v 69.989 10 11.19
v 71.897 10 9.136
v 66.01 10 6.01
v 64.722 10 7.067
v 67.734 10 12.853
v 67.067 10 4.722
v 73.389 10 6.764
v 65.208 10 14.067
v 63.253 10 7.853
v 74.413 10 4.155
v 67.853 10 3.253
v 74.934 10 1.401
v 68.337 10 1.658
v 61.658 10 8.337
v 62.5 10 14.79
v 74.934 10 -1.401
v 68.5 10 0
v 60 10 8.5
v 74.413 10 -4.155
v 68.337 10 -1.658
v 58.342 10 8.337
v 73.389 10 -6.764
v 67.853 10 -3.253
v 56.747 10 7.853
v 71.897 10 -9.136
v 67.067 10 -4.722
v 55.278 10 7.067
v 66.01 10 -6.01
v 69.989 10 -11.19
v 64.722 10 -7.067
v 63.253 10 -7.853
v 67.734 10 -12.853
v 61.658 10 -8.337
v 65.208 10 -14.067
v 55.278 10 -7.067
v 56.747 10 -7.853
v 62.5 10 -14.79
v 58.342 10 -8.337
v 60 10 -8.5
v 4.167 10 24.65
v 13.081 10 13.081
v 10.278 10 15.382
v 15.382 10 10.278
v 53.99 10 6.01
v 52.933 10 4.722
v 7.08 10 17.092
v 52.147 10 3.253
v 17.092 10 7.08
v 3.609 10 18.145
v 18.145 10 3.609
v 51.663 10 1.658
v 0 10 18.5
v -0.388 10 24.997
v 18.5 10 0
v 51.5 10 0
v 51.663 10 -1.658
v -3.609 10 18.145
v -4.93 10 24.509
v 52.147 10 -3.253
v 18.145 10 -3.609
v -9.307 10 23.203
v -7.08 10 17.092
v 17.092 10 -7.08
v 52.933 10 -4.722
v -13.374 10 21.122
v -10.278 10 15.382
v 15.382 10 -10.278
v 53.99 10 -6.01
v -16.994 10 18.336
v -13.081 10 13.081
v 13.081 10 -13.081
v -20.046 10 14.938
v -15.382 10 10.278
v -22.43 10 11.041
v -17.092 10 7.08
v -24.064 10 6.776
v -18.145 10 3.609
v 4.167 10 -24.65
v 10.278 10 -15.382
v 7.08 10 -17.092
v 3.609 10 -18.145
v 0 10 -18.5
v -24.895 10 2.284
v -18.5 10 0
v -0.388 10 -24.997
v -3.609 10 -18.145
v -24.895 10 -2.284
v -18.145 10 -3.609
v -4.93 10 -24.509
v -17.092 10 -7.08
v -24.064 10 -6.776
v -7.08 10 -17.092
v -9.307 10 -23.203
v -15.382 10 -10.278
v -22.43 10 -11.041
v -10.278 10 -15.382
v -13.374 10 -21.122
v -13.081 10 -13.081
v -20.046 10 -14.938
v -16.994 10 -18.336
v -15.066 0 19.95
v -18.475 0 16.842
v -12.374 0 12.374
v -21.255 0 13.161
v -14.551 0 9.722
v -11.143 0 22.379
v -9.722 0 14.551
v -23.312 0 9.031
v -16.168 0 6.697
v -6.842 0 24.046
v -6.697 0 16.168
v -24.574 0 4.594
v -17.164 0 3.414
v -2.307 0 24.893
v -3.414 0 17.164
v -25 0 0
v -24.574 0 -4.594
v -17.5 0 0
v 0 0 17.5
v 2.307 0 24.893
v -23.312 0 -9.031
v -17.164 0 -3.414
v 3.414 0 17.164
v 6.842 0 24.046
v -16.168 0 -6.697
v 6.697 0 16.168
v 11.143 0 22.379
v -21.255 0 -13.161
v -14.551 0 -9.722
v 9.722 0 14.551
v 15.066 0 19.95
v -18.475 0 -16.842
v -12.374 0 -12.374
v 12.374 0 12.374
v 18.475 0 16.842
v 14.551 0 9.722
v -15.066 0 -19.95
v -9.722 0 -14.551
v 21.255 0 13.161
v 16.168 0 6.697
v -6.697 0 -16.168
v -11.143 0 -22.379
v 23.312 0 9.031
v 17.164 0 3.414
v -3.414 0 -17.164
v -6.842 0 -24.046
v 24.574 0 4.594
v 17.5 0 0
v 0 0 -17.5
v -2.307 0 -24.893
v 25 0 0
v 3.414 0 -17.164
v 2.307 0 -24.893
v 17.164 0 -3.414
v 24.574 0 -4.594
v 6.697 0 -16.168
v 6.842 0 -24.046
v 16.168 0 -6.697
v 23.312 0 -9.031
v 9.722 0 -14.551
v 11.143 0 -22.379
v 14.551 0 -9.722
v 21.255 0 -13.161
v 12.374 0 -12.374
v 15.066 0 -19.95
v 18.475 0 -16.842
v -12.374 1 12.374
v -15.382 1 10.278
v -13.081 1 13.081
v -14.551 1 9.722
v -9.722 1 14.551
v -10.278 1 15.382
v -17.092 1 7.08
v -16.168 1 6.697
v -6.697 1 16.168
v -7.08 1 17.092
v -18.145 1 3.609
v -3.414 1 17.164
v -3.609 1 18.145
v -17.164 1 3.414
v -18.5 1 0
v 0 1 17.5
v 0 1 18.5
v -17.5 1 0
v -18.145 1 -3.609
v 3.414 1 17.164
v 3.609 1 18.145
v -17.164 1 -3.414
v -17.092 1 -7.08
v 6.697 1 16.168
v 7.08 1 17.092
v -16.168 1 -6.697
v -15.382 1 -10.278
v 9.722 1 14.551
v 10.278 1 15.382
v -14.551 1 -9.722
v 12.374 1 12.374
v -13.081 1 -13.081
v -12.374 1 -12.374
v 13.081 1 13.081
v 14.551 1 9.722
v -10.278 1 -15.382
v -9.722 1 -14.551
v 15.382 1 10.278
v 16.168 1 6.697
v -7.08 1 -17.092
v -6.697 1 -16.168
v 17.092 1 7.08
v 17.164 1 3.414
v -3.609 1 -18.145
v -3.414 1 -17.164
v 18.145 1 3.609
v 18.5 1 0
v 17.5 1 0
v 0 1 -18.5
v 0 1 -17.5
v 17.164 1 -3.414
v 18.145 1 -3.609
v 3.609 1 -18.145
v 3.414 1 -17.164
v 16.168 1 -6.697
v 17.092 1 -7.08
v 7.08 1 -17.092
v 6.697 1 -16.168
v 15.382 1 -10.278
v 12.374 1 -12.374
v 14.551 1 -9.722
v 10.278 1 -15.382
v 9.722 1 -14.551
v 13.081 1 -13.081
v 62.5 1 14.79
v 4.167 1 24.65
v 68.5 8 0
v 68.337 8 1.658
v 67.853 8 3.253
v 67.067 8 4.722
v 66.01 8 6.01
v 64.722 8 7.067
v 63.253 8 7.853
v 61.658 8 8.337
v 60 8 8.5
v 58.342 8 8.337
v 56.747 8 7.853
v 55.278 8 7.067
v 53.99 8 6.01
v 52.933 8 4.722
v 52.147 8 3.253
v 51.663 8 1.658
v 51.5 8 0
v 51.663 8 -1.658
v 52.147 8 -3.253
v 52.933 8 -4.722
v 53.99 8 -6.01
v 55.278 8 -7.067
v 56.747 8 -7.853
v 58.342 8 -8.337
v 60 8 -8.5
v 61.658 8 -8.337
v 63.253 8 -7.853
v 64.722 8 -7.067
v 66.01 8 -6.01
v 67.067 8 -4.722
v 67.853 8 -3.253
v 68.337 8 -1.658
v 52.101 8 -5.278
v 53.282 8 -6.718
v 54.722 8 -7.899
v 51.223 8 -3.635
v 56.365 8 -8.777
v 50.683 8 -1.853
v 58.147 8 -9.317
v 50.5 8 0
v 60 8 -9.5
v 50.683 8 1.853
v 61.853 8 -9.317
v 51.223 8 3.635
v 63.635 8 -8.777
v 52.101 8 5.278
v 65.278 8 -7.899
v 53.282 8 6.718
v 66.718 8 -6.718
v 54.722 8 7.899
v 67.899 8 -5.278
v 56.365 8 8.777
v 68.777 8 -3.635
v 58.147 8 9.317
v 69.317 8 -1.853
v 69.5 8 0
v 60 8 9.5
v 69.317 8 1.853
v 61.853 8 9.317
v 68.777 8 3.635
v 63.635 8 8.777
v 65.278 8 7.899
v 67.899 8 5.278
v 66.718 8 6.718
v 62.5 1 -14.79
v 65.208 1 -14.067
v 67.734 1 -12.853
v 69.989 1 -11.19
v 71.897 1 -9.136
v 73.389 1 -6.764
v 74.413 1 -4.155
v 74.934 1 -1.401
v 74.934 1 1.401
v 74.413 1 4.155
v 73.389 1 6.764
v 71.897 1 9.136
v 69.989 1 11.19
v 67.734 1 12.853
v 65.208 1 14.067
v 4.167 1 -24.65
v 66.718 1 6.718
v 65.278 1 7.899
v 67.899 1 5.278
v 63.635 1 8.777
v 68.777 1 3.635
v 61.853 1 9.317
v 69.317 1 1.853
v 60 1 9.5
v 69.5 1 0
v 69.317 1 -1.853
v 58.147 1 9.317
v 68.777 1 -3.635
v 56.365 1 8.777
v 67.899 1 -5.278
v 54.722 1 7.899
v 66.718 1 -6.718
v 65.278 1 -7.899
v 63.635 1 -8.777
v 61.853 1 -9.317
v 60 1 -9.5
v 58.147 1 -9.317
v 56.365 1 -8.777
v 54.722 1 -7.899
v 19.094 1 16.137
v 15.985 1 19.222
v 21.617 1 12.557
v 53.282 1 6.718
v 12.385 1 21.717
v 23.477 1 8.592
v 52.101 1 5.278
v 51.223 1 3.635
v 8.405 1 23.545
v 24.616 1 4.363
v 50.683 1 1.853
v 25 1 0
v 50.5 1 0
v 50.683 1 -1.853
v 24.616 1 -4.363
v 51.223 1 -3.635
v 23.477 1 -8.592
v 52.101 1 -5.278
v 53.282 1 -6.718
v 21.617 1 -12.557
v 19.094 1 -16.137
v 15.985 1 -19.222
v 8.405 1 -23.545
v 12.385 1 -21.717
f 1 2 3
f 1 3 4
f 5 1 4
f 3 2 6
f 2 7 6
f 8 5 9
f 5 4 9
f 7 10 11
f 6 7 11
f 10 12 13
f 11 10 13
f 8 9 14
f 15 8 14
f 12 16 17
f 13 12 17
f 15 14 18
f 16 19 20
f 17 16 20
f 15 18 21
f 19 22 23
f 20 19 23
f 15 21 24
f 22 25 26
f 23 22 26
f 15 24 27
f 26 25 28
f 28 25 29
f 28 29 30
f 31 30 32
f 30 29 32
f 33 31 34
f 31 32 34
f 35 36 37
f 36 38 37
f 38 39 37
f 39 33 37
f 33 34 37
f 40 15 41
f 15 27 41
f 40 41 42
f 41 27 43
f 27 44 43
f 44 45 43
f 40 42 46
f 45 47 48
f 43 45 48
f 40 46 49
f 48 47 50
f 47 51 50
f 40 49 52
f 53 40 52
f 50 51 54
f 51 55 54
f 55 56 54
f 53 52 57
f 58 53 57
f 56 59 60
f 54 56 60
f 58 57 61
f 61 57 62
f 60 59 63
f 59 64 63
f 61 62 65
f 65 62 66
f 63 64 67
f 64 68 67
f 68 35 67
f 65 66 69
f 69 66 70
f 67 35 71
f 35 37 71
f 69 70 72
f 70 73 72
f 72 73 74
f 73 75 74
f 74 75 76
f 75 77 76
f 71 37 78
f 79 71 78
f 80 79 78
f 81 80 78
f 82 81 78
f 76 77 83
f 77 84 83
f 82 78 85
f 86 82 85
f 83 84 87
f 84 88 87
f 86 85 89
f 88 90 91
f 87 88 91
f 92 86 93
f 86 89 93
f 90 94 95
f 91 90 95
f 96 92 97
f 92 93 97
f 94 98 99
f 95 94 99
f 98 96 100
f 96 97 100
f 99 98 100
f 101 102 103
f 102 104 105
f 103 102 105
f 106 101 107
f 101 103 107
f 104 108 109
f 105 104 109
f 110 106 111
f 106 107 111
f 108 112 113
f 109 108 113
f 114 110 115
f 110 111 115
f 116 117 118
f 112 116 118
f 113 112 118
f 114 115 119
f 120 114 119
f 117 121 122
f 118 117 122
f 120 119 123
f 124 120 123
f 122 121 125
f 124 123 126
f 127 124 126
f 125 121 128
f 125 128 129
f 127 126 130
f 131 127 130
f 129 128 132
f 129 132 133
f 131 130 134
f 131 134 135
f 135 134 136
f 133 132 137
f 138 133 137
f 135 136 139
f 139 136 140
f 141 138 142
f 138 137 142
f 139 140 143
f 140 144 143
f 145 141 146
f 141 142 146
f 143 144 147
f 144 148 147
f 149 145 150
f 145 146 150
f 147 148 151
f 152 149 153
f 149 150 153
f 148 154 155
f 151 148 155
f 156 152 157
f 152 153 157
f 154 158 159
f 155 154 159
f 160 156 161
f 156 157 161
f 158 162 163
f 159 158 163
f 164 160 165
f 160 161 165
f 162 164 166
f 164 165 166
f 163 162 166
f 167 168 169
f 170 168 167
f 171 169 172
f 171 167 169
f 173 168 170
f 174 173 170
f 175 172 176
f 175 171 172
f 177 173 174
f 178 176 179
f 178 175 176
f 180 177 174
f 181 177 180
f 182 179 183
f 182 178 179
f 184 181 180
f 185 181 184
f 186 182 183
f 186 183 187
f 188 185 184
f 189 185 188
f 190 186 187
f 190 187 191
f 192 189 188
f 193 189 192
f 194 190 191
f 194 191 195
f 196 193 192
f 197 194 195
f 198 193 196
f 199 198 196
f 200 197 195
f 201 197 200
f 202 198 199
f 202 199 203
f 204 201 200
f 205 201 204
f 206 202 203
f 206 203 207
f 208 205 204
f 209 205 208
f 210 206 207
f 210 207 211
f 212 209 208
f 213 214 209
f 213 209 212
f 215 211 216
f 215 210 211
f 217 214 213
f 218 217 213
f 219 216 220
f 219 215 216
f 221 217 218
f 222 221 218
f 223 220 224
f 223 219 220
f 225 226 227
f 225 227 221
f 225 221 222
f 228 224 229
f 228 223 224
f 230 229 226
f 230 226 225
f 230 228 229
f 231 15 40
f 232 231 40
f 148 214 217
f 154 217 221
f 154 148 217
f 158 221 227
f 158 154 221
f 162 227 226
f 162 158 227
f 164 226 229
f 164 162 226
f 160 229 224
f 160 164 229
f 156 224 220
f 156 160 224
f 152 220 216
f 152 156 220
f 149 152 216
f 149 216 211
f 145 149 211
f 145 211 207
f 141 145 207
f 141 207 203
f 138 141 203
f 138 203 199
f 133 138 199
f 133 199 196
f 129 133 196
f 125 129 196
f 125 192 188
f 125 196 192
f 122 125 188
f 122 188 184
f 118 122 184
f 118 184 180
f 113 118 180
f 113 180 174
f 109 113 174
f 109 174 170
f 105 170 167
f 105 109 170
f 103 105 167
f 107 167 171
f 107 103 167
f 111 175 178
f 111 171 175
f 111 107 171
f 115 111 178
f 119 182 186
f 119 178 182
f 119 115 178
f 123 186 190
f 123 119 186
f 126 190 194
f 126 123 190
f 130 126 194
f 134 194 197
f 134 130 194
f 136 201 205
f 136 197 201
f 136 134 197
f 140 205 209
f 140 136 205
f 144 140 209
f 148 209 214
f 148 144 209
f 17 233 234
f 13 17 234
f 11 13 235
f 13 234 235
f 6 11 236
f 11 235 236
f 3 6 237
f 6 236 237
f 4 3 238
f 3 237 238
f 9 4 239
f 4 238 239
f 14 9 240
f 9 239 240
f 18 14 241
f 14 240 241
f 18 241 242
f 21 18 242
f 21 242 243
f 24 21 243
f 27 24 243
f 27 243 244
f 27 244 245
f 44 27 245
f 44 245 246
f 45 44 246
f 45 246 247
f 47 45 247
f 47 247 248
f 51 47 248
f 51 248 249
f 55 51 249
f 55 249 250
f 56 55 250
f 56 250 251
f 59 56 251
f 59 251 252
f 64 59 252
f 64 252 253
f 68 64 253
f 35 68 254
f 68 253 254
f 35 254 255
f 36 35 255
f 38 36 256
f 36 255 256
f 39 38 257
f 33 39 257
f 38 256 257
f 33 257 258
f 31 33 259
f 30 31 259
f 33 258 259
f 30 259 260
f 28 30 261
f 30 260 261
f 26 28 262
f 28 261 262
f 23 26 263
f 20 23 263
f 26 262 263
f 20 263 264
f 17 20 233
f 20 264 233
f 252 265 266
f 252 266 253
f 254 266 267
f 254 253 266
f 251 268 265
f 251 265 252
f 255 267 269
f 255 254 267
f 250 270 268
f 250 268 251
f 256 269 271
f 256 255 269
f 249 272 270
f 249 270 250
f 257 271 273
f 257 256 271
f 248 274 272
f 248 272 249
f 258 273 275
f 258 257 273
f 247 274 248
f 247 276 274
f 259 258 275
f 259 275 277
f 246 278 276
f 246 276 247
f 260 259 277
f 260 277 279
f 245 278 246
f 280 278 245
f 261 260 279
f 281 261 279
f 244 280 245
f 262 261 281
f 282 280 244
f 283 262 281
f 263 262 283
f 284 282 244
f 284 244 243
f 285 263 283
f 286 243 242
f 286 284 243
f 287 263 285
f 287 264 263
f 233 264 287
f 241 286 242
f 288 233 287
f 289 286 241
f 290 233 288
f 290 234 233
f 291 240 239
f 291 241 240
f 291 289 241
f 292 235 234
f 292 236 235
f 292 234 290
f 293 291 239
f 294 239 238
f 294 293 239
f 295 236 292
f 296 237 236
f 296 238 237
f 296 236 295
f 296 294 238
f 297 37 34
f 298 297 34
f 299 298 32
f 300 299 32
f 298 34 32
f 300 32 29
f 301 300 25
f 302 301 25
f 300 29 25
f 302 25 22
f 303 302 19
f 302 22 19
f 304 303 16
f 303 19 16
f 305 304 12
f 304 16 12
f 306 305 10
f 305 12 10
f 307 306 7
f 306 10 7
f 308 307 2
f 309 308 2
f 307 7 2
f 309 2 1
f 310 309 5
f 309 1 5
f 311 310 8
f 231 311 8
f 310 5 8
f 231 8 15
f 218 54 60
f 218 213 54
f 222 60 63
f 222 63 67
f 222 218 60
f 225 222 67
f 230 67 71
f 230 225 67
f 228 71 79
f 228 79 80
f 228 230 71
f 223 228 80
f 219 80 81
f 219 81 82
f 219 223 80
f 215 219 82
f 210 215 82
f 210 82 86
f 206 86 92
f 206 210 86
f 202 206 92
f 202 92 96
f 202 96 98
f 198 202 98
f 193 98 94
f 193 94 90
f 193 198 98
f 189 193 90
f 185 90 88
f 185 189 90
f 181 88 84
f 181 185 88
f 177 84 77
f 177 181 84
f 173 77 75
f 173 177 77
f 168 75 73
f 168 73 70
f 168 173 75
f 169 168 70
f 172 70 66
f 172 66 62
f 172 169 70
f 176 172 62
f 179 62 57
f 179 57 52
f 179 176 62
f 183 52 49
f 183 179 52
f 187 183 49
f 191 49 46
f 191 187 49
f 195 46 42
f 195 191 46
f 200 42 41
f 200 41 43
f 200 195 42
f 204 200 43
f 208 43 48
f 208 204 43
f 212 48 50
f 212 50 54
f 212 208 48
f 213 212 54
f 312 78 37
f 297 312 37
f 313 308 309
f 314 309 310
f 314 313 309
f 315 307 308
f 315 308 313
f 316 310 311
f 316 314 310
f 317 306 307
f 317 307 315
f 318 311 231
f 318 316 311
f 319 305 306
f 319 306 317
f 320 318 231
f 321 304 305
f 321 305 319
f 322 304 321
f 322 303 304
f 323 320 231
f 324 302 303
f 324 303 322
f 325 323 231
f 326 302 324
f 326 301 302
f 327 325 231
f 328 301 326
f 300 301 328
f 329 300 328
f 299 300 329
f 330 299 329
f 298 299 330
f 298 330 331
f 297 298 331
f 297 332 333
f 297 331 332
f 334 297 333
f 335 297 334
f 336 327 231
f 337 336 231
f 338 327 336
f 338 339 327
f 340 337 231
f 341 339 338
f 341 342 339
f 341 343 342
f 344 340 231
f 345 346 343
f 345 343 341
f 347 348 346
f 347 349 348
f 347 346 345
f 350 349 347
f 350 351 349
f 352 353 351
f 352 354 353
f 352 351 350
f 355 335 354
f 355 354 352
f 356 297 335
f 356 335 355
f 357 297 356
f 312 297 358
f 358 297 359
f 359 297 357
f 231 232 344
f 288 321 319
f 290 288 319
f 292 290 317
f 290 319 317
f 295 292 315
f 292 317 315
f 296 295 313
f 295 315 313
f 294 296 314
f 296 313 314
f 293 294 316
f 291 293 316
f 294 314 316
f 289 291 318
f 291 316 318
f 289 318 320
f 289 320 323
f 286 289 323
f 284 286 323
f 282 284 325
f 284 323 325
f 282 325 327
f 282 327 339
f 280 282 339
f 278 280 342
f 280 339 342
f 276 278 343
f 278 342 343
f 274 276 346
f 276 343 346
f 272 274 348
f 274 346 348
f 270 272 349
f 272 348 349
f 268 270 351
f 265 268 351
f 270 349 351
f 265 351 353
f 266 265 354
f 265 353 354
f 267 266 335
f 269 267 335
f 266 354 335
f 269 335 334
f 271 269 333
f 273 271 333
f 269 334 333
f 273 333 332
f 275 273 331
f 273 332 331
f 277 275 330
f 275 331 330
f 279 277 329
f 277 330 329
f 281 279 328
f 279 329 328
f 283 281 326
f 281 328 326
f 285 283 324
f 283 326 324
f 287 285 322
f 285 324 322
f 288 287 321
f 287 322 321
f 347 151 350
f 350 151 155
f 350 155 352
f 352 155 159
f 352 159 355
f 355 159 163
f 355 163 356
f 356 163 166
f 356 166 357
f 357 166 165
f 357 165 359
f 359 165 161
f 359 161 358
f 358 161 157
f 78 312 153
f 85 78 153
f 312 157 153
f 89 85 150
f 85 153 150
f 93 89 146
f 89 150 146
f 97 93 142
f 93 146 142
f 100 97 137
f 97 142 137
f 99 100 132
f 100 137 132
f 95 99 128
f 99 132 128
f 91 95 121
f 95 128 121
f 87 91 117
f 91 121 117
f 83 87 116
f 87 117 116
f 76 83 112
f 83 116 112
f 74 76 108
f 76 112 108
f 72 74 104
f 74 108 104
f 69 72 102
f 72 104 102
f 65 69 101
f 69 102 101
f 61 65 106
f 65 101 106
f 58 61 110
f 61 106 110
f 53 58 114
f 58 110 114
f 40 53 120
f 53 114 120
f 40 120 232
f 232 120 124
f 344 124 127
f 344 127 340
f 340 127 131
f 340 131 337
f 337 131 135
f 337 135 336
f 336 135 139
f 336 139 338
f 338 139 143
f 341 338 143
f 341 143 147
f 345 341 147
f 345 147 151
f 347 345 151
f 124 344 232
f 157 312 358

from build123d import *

# Parameters (mm, degrees)
SKETCH_1_R           = 25
SKETCH_1_R_2         = 17.5
EXTRUDE_1_DEPTH      = 5
SKETCH_2_R           = 25
SKETCH_2_R_2         = 18.5
EXTRUDE_2_DEPTH      = 5
EXTRUDE_3_DEPTH      = 9
SKETCH_7_R           = 18.5
CUT_EXTRUDE_4_DEPTH  = 4
SKETCH_13_R          = 9.5
CUT_EXTRUDE_9_DEPTH  = 7
SKETCH_14_R          = 8.5
CUT_EXTRUDE_10_DEPTH = 3


with BuildPart() as part:
    # 스케치1 → 보스-돌출1 (new body)
    with BuildSketch(Plane(origin=(0, 0, 0), x_dir=(1, 0, 0), z_dir=(0, 1, 0))):
        Circle(SKETCH_1_R)
        Circle(SKETCH_1_R_2, mode=Mode.SUBTRACT)
    extrude(amount=EXTRUDE_1_DEPTH)

    # 스케치2 → 보스-돌출2 (add)
    with BuildSketch(Plane(origin=(0, 5, 0), x_dir=(1, 0, 0), z_dir=(0, 1, 0))):
        Circle(SKETCH_2_R)
        Circle(SKETCH_2_R_2, mode=Mode.SUBTRACT)
    extrude(amount=EXTRUDE_2_DEPTH)

    # 스케치3 → 보스-돌출3 (add)
    with BuildSketch(Plane(origin=(0, 10, 0), x_dir=(1, 0, 0), z_dir=(0, 1, 0))):
        with BuildLine():
            Line((4.166666667, 24.65033243), (62.5, 14.790199458))
            ThreePointArc((62.5, 14.790199458), (75, 0), (62.5, -14.790199458))
            Line((62.5, -14.790199458), (4.166666667, -24.65033243))
            ThreePointArc((4.166666667, -24.65033243), (25, 0), (4.166666667, 24.65033243))
        make_face()
    extrude(amount=-EXTRUDE_3_DEPTH)

    # 스케치7 → 컷-돌출4 (cut)
    with BuildSketch(Plane(origin=(0, 5, 0), x_dir=(1, 0, 0), z_dir=(0, 1, 0))):
        Circle(SKETCH_7_R)
    extrude(amount=-CUT_EXTRUDE_4_DEPTH, mode=Mode.SUBTRACT)

    # 스케치13 → 컷-돌출9 (cut)
    with BuildSketch(Plane.XZ.offset(-1)):
        with Locations((60, 0)):
            Circle(SKETCH_13_R)
    extrude(amount=-CUT_EXTRUDE_9_DEPTH, mode=Mode.SUBTRACT)

    # 스케치14 → 컷-돌출10 (cut, through all)
    with BuildSketch(Plane.XZ.offset(-8)):
        with Locations((60, 0)):
            Circle(SKETCH_14_R)
    extrude(amount=-CUT_EXTRUDE_10_DEPTH, mode=Mode.SUBTRACT)


solid = part.part
